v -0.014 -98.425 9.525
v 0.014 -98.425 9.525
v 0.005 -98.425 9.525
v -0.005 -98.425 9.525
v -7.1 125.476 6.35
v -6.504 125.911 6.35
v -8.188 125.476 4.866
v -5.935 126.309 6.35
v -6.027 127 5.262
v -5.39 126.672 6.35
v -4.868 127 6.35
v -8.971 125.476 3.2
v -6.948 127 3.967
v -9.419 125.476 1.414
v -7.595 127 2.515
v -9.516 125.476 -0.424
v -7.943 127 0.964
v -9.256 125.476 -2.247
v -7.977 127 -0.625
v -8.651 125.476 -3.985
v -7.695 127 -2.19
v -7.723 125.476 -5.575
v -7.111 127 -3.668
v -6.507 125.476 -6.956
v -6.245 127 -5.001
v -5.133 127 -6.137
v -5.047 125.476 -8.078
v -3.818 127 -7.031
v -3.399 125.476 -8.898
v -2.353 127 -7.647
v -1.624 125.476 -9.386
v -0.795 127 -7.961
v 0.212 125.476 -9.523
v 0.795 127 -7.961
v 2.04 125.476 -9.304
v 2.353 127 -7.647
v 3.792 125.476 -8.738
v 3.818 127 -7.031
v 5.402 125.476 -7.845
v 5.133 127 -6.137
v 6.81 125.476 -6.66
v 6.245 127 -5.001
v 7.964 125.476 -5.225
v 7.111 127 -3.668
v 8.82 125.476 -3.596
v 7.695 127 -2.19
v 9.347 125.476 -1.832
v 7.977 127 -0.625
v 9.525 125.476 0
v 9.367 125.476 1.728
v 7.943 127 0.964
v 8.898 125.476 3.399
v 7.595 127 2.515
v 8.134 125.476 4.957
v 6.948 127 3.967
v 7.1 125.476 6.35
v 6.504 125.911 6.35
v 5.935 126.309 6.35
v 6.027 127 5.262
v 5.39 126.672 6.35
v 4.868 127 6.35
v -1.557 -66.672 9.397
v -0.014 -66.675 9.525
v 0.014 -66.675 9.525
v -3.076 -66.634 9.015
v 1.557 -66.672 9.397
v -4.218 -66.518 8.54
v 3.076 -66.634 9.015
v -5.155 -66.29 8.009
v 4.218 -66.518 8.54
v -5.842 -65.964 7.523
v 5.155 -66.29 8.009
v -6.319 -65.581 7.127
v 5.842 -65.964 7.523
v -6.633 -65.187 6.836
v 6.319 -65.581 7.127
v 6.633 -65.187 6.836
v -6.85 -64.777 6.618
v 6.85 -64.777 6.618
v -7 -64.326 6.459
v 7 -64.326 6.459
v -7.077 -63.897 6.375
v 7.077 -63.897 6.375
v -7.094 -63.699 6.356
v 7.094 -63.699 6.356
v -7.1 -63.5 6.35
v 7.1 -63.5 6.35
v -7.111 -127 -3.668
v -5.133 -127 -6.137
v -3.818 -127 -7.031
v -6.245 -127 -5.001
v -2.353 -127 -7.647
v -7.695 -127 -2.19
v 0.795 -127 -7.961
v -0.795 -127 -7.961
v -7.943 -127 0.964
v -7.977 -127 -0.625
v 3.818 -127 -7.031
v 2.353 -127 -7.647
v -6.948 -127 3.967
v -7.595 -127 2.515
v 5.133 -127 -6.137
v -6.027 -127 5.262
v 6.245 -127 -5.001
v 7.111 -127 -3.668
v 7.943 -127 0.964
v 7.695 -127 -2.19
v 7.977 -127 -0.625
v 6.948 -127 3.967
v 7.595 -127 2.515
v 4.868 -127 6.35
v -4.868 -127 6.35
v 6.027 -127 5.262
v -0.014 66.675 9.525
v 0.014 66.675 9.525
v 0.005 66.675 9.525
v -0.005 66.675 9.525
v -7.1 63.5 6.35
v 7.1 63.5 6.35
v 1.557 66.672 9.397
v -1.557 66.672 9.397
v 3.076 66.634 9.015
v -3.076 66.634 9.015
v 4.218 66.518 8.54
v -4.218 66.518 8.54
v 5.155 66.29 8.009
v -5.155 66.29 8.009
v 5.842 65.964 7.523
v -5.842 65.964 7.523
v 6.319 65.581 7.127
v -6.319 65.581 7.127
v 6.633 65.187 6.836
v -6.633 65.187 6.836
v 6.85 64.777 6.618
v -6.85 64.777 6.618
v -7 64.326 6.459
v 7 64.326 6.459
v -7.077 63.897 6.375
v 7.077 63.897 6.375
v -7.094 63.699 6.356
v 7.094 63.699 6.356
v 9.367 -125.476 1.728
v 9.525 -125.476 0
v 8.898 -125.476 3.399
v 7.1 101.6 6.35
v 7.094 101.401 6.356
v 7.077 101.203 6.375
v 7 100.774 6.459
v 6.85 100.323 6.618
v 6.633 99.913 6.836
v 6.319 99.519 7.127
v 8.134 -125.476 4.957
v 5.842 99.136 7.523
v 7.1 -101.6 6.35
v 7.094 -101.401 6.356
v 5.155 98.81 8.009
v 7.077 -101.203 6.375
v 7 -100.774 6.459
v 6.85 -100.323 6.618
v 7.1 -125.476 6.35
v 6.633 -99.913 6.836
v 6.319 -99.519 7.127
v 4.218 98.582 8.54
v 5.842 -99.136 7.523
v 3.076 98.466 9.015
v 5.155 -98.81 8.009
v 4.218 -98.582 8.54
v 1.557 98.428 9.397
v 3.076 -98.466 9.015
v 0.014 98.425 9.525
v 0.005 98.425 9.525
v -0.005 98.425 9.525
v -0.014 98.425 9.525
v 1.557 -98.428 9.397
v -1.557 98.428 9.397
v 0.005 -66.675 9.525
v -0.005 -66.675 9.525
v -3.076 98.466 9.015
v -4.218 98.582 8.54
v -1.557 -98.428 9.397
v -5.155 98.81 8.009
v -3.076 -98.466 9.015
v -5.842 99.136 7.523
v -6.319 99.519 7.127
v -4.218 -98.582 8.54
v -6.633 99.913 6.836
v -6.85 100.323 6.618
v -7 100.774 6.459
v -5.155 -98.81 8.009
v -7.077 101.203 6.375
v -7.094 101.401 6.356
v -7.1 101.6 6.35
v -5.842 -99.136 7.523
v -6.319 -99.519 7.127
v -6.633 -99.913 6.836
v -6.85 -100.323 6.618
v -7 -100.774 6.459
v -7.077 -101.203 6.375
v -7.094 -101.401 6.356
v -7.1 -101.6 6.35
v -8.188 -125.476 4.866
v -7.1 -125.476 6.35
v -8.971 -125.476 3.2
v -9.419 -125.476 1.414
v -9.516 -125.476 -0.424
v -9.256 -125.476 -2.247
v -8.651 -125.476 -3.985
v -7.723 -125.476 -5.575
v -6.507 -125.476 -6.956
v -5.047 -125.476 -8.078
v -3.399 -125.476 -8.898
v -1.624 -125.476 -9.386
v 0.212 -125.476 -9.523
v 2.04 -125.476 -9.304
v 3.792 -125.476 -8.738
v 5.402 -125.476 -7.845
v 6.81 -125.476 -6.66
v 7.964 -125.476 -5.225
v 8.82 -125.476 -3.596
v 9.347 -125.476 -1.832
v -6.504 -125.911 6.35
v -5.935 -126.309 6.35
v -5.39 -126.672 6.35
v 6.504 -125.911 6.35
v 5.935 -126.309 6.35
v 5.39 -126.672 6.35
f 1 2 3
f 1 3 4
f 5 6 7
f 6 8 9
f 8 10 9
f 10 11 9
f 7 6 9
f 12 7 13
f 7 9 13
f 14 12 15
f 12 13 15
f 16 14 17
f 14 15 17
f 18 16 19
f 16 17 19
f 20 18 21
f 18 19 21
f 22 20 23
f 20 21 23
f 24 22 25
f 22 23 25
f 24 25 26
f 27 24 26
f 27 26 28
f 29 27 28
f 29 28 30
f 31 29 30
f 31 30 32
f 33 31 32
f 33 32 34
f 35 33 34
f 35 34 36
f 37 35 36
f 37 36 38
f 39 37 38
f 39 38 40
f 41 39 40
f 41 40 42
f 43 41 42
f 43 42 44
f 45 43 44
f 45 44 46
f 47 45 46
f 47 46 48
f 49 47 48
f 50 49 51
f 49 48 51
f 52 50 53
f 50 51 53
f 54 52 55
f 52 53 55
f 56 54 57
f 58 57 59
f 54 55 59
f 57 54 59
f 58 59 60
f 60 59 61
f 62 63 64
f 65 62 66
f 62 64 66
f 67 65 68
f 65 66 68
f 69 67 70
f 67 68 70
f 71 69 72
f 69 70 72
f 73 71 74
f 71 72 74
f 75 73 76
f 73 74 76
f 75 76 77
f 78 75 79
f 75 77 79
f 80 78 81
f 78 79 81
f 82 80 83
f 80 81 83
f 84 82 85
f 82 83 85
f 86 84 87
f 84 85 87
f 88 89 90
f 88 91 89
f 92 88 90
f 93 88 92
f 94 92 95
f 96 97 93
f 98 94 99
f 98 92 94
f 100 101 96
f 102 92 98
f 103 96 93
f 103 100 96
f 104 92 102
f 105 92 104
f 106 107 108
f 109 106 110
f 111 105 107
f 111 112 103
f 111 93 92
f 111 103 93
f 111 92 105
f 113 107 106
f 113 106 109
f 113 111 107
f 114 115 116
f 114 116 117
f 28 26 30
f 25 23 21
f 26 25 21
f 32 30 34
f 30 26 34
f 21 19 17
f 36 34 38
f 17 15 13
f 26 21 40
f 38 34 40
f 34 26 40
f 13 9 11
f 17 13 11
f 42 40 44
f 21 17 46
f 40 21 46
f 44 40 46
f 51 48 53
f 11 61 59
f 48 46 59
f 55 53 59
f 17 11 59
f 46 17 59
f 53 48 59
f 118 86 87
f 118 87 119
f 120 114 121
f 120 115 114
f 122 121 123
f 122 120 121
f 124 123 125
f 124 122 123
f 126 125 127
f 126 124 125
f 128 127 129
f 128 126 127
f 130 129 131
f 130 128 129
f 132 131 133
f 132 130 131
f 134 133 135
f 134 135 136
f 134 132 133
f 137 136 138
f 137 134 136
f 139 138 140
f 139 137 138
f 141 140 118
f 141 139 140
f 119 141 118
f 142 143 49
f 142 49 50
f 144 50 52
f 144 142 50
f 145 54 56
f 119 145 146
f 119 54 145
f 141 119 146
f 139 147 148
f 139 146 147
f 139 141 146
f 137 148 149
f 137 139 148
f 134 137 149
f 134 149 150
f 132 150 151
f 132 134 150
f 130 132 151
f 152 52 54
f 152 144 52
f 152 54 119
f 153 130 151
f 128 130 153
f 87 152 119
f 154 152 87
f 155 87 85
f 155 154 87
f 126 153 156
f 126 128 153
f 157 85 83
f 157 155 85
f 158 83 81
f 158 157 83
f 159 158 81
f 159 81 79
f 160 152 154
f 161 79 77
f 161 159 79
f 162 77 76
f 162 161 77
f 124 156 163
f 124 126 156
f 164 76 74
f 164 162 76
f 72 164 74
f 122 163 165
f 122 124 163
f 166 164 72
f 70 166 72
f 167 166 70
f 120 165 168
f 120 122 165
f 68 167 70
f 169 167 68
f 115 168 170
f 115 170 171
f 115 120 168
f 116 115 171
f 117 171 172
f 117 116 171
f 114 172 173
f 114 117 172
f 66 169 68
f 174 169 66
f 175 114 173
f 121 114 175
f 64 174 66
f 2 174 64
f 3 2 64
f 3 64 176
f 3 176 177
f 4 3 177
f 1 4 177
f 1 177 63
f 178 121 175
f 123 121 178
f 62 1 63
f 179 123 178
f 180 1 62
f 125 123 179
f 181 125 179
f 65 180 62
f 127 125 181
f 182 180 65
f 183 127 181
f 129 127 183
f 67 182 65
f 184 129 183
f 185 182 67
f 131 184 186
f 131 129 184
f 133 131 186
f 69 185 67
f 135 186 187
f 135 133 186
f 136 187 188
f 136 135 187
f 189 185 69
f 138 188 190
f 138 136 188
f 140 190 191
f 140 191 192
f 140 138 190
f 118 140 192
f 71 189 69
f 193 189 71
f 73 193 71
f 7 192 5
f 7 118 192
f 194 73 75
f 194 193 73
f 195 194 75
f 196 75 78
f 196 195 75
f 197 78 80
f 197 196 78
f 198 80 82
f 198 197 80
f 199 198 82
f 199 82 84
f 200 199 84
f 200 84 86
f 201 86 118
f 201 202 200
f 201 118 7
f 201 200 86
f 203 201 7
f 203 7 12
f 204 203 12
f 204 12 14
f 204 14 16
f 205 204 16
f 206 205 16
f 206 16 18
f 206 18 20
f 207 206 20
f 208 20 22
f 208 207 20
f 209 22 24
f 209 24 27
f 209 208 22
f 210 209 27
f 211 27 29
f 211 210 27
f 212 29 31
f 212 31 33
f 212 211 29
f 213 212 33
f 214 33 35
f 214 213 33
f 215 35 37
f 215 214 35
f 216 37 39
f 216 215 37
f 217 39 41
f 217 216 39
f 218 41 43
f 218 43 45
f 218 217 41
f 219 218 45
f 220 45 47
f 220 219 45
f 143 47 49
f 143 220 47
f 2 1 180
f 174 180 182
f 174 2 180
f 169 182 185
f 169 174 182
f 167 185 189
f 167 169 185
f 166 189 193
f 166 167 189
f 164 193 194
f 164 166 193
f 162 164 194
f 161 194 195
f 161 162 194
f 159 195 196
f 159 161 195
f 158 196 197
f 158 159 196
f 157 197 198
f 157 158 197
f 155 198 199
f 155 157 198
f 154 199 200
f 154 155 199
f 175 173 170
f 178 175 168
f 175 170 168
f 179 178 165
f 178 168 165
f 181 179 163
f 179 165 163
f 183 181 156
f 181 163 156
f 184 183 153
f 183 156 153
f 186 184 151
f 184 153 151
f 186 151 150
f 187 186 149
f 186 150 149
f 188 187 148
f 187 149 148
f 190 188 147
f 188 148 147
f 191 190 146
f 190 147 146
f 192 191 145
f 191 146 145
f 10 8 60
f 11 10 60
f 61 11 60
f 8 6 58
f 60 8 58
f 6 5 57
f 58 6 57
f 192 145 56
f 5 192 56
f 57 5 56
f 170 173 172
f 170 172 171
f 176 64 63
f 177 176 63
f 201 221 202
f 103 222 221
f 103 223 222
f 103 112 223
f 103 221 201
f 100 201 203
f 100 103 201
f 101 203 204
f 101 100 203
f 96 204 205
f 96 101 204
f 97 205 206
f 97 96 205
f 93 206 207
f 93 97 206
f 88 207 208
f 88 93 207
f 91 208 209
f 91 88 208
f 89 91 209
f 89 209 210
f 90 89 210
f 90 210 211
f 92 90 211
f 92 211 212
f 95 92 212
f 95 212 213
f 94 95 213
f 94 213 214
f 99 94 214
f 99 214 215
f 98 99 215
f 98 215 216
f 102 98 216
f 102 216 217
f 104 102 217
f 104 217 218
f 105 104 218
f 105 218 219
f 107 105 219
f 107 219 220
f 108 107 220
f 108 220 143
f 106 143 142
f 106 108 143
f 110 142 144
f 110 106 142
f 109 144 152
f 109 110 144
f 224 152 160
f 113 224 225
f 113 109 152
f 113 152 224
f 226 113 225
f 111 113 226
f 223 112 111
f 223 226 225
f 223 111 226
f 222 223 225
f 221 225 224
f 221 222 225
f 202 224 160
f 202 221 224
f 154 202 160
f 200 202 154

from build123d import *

# Parameters (mm, degrees)
F0_R     = 9.525
F1_DEPTH = 127
F2_W     = 133.35
F2_H     = 3.175
F2_W_2   = 28.575
F3_DEPTH = 12.7
F4_SIZE  = 1.524
F5_R     = 3.17499


# Not quite as in the source:
# - a fillet or chamfer is up to 0.001 mm smaller than in the source, because OpenCascade refuses the exact size


with BuildPart() as f1:
    # F0 (on Front) → F1 (new body, symmetric)
    with BuildSketch(Plane.XZ):
        Circle(F0_R)
    extrude(amount=F1_DEPTH, both=True)

    # F2 (on Right) → F3 (cut, symmetric)
    with BuildSketch(Plane.YZ):
        with Locations((0, 7.9375)):
            Rectangle(F2_W, F2_H)
        with Locations((-112.7125, 7.9375)):
            Rectangle(F2_W_2, F2_H)
        with Locations((112.7125, 7.9375)):
            Rectangle(F2_W_2, F2_H)
    extrude(amount=F3_DEPTH, both=True, mode=Mode.SUBTRACT)

    # F4
    f4_edges = [f1.edges().sort_by_distance(p)[0] for p in [
        (-3.39873, -127, -8.897992),
        (-3.39873, 127, -8.897992),
    ]]
    chamfer(f4_edges, length=F4_SIZE)

    # F5 (radius 3.175 in the source; OpenCascade refuses exactly that, so slightly less here)
    f5_edges = [f1.edges().sort_by_distance(p)[0] for p in [
        (0, -98.425, 6.35),
        (0, 66.675, 6.35),
        (0, 98.425, 6.35),
        (0, -66.675, 6.35),
    ]]
    fillet(f5_edges, radius=F5_R)


solid = f1.part
